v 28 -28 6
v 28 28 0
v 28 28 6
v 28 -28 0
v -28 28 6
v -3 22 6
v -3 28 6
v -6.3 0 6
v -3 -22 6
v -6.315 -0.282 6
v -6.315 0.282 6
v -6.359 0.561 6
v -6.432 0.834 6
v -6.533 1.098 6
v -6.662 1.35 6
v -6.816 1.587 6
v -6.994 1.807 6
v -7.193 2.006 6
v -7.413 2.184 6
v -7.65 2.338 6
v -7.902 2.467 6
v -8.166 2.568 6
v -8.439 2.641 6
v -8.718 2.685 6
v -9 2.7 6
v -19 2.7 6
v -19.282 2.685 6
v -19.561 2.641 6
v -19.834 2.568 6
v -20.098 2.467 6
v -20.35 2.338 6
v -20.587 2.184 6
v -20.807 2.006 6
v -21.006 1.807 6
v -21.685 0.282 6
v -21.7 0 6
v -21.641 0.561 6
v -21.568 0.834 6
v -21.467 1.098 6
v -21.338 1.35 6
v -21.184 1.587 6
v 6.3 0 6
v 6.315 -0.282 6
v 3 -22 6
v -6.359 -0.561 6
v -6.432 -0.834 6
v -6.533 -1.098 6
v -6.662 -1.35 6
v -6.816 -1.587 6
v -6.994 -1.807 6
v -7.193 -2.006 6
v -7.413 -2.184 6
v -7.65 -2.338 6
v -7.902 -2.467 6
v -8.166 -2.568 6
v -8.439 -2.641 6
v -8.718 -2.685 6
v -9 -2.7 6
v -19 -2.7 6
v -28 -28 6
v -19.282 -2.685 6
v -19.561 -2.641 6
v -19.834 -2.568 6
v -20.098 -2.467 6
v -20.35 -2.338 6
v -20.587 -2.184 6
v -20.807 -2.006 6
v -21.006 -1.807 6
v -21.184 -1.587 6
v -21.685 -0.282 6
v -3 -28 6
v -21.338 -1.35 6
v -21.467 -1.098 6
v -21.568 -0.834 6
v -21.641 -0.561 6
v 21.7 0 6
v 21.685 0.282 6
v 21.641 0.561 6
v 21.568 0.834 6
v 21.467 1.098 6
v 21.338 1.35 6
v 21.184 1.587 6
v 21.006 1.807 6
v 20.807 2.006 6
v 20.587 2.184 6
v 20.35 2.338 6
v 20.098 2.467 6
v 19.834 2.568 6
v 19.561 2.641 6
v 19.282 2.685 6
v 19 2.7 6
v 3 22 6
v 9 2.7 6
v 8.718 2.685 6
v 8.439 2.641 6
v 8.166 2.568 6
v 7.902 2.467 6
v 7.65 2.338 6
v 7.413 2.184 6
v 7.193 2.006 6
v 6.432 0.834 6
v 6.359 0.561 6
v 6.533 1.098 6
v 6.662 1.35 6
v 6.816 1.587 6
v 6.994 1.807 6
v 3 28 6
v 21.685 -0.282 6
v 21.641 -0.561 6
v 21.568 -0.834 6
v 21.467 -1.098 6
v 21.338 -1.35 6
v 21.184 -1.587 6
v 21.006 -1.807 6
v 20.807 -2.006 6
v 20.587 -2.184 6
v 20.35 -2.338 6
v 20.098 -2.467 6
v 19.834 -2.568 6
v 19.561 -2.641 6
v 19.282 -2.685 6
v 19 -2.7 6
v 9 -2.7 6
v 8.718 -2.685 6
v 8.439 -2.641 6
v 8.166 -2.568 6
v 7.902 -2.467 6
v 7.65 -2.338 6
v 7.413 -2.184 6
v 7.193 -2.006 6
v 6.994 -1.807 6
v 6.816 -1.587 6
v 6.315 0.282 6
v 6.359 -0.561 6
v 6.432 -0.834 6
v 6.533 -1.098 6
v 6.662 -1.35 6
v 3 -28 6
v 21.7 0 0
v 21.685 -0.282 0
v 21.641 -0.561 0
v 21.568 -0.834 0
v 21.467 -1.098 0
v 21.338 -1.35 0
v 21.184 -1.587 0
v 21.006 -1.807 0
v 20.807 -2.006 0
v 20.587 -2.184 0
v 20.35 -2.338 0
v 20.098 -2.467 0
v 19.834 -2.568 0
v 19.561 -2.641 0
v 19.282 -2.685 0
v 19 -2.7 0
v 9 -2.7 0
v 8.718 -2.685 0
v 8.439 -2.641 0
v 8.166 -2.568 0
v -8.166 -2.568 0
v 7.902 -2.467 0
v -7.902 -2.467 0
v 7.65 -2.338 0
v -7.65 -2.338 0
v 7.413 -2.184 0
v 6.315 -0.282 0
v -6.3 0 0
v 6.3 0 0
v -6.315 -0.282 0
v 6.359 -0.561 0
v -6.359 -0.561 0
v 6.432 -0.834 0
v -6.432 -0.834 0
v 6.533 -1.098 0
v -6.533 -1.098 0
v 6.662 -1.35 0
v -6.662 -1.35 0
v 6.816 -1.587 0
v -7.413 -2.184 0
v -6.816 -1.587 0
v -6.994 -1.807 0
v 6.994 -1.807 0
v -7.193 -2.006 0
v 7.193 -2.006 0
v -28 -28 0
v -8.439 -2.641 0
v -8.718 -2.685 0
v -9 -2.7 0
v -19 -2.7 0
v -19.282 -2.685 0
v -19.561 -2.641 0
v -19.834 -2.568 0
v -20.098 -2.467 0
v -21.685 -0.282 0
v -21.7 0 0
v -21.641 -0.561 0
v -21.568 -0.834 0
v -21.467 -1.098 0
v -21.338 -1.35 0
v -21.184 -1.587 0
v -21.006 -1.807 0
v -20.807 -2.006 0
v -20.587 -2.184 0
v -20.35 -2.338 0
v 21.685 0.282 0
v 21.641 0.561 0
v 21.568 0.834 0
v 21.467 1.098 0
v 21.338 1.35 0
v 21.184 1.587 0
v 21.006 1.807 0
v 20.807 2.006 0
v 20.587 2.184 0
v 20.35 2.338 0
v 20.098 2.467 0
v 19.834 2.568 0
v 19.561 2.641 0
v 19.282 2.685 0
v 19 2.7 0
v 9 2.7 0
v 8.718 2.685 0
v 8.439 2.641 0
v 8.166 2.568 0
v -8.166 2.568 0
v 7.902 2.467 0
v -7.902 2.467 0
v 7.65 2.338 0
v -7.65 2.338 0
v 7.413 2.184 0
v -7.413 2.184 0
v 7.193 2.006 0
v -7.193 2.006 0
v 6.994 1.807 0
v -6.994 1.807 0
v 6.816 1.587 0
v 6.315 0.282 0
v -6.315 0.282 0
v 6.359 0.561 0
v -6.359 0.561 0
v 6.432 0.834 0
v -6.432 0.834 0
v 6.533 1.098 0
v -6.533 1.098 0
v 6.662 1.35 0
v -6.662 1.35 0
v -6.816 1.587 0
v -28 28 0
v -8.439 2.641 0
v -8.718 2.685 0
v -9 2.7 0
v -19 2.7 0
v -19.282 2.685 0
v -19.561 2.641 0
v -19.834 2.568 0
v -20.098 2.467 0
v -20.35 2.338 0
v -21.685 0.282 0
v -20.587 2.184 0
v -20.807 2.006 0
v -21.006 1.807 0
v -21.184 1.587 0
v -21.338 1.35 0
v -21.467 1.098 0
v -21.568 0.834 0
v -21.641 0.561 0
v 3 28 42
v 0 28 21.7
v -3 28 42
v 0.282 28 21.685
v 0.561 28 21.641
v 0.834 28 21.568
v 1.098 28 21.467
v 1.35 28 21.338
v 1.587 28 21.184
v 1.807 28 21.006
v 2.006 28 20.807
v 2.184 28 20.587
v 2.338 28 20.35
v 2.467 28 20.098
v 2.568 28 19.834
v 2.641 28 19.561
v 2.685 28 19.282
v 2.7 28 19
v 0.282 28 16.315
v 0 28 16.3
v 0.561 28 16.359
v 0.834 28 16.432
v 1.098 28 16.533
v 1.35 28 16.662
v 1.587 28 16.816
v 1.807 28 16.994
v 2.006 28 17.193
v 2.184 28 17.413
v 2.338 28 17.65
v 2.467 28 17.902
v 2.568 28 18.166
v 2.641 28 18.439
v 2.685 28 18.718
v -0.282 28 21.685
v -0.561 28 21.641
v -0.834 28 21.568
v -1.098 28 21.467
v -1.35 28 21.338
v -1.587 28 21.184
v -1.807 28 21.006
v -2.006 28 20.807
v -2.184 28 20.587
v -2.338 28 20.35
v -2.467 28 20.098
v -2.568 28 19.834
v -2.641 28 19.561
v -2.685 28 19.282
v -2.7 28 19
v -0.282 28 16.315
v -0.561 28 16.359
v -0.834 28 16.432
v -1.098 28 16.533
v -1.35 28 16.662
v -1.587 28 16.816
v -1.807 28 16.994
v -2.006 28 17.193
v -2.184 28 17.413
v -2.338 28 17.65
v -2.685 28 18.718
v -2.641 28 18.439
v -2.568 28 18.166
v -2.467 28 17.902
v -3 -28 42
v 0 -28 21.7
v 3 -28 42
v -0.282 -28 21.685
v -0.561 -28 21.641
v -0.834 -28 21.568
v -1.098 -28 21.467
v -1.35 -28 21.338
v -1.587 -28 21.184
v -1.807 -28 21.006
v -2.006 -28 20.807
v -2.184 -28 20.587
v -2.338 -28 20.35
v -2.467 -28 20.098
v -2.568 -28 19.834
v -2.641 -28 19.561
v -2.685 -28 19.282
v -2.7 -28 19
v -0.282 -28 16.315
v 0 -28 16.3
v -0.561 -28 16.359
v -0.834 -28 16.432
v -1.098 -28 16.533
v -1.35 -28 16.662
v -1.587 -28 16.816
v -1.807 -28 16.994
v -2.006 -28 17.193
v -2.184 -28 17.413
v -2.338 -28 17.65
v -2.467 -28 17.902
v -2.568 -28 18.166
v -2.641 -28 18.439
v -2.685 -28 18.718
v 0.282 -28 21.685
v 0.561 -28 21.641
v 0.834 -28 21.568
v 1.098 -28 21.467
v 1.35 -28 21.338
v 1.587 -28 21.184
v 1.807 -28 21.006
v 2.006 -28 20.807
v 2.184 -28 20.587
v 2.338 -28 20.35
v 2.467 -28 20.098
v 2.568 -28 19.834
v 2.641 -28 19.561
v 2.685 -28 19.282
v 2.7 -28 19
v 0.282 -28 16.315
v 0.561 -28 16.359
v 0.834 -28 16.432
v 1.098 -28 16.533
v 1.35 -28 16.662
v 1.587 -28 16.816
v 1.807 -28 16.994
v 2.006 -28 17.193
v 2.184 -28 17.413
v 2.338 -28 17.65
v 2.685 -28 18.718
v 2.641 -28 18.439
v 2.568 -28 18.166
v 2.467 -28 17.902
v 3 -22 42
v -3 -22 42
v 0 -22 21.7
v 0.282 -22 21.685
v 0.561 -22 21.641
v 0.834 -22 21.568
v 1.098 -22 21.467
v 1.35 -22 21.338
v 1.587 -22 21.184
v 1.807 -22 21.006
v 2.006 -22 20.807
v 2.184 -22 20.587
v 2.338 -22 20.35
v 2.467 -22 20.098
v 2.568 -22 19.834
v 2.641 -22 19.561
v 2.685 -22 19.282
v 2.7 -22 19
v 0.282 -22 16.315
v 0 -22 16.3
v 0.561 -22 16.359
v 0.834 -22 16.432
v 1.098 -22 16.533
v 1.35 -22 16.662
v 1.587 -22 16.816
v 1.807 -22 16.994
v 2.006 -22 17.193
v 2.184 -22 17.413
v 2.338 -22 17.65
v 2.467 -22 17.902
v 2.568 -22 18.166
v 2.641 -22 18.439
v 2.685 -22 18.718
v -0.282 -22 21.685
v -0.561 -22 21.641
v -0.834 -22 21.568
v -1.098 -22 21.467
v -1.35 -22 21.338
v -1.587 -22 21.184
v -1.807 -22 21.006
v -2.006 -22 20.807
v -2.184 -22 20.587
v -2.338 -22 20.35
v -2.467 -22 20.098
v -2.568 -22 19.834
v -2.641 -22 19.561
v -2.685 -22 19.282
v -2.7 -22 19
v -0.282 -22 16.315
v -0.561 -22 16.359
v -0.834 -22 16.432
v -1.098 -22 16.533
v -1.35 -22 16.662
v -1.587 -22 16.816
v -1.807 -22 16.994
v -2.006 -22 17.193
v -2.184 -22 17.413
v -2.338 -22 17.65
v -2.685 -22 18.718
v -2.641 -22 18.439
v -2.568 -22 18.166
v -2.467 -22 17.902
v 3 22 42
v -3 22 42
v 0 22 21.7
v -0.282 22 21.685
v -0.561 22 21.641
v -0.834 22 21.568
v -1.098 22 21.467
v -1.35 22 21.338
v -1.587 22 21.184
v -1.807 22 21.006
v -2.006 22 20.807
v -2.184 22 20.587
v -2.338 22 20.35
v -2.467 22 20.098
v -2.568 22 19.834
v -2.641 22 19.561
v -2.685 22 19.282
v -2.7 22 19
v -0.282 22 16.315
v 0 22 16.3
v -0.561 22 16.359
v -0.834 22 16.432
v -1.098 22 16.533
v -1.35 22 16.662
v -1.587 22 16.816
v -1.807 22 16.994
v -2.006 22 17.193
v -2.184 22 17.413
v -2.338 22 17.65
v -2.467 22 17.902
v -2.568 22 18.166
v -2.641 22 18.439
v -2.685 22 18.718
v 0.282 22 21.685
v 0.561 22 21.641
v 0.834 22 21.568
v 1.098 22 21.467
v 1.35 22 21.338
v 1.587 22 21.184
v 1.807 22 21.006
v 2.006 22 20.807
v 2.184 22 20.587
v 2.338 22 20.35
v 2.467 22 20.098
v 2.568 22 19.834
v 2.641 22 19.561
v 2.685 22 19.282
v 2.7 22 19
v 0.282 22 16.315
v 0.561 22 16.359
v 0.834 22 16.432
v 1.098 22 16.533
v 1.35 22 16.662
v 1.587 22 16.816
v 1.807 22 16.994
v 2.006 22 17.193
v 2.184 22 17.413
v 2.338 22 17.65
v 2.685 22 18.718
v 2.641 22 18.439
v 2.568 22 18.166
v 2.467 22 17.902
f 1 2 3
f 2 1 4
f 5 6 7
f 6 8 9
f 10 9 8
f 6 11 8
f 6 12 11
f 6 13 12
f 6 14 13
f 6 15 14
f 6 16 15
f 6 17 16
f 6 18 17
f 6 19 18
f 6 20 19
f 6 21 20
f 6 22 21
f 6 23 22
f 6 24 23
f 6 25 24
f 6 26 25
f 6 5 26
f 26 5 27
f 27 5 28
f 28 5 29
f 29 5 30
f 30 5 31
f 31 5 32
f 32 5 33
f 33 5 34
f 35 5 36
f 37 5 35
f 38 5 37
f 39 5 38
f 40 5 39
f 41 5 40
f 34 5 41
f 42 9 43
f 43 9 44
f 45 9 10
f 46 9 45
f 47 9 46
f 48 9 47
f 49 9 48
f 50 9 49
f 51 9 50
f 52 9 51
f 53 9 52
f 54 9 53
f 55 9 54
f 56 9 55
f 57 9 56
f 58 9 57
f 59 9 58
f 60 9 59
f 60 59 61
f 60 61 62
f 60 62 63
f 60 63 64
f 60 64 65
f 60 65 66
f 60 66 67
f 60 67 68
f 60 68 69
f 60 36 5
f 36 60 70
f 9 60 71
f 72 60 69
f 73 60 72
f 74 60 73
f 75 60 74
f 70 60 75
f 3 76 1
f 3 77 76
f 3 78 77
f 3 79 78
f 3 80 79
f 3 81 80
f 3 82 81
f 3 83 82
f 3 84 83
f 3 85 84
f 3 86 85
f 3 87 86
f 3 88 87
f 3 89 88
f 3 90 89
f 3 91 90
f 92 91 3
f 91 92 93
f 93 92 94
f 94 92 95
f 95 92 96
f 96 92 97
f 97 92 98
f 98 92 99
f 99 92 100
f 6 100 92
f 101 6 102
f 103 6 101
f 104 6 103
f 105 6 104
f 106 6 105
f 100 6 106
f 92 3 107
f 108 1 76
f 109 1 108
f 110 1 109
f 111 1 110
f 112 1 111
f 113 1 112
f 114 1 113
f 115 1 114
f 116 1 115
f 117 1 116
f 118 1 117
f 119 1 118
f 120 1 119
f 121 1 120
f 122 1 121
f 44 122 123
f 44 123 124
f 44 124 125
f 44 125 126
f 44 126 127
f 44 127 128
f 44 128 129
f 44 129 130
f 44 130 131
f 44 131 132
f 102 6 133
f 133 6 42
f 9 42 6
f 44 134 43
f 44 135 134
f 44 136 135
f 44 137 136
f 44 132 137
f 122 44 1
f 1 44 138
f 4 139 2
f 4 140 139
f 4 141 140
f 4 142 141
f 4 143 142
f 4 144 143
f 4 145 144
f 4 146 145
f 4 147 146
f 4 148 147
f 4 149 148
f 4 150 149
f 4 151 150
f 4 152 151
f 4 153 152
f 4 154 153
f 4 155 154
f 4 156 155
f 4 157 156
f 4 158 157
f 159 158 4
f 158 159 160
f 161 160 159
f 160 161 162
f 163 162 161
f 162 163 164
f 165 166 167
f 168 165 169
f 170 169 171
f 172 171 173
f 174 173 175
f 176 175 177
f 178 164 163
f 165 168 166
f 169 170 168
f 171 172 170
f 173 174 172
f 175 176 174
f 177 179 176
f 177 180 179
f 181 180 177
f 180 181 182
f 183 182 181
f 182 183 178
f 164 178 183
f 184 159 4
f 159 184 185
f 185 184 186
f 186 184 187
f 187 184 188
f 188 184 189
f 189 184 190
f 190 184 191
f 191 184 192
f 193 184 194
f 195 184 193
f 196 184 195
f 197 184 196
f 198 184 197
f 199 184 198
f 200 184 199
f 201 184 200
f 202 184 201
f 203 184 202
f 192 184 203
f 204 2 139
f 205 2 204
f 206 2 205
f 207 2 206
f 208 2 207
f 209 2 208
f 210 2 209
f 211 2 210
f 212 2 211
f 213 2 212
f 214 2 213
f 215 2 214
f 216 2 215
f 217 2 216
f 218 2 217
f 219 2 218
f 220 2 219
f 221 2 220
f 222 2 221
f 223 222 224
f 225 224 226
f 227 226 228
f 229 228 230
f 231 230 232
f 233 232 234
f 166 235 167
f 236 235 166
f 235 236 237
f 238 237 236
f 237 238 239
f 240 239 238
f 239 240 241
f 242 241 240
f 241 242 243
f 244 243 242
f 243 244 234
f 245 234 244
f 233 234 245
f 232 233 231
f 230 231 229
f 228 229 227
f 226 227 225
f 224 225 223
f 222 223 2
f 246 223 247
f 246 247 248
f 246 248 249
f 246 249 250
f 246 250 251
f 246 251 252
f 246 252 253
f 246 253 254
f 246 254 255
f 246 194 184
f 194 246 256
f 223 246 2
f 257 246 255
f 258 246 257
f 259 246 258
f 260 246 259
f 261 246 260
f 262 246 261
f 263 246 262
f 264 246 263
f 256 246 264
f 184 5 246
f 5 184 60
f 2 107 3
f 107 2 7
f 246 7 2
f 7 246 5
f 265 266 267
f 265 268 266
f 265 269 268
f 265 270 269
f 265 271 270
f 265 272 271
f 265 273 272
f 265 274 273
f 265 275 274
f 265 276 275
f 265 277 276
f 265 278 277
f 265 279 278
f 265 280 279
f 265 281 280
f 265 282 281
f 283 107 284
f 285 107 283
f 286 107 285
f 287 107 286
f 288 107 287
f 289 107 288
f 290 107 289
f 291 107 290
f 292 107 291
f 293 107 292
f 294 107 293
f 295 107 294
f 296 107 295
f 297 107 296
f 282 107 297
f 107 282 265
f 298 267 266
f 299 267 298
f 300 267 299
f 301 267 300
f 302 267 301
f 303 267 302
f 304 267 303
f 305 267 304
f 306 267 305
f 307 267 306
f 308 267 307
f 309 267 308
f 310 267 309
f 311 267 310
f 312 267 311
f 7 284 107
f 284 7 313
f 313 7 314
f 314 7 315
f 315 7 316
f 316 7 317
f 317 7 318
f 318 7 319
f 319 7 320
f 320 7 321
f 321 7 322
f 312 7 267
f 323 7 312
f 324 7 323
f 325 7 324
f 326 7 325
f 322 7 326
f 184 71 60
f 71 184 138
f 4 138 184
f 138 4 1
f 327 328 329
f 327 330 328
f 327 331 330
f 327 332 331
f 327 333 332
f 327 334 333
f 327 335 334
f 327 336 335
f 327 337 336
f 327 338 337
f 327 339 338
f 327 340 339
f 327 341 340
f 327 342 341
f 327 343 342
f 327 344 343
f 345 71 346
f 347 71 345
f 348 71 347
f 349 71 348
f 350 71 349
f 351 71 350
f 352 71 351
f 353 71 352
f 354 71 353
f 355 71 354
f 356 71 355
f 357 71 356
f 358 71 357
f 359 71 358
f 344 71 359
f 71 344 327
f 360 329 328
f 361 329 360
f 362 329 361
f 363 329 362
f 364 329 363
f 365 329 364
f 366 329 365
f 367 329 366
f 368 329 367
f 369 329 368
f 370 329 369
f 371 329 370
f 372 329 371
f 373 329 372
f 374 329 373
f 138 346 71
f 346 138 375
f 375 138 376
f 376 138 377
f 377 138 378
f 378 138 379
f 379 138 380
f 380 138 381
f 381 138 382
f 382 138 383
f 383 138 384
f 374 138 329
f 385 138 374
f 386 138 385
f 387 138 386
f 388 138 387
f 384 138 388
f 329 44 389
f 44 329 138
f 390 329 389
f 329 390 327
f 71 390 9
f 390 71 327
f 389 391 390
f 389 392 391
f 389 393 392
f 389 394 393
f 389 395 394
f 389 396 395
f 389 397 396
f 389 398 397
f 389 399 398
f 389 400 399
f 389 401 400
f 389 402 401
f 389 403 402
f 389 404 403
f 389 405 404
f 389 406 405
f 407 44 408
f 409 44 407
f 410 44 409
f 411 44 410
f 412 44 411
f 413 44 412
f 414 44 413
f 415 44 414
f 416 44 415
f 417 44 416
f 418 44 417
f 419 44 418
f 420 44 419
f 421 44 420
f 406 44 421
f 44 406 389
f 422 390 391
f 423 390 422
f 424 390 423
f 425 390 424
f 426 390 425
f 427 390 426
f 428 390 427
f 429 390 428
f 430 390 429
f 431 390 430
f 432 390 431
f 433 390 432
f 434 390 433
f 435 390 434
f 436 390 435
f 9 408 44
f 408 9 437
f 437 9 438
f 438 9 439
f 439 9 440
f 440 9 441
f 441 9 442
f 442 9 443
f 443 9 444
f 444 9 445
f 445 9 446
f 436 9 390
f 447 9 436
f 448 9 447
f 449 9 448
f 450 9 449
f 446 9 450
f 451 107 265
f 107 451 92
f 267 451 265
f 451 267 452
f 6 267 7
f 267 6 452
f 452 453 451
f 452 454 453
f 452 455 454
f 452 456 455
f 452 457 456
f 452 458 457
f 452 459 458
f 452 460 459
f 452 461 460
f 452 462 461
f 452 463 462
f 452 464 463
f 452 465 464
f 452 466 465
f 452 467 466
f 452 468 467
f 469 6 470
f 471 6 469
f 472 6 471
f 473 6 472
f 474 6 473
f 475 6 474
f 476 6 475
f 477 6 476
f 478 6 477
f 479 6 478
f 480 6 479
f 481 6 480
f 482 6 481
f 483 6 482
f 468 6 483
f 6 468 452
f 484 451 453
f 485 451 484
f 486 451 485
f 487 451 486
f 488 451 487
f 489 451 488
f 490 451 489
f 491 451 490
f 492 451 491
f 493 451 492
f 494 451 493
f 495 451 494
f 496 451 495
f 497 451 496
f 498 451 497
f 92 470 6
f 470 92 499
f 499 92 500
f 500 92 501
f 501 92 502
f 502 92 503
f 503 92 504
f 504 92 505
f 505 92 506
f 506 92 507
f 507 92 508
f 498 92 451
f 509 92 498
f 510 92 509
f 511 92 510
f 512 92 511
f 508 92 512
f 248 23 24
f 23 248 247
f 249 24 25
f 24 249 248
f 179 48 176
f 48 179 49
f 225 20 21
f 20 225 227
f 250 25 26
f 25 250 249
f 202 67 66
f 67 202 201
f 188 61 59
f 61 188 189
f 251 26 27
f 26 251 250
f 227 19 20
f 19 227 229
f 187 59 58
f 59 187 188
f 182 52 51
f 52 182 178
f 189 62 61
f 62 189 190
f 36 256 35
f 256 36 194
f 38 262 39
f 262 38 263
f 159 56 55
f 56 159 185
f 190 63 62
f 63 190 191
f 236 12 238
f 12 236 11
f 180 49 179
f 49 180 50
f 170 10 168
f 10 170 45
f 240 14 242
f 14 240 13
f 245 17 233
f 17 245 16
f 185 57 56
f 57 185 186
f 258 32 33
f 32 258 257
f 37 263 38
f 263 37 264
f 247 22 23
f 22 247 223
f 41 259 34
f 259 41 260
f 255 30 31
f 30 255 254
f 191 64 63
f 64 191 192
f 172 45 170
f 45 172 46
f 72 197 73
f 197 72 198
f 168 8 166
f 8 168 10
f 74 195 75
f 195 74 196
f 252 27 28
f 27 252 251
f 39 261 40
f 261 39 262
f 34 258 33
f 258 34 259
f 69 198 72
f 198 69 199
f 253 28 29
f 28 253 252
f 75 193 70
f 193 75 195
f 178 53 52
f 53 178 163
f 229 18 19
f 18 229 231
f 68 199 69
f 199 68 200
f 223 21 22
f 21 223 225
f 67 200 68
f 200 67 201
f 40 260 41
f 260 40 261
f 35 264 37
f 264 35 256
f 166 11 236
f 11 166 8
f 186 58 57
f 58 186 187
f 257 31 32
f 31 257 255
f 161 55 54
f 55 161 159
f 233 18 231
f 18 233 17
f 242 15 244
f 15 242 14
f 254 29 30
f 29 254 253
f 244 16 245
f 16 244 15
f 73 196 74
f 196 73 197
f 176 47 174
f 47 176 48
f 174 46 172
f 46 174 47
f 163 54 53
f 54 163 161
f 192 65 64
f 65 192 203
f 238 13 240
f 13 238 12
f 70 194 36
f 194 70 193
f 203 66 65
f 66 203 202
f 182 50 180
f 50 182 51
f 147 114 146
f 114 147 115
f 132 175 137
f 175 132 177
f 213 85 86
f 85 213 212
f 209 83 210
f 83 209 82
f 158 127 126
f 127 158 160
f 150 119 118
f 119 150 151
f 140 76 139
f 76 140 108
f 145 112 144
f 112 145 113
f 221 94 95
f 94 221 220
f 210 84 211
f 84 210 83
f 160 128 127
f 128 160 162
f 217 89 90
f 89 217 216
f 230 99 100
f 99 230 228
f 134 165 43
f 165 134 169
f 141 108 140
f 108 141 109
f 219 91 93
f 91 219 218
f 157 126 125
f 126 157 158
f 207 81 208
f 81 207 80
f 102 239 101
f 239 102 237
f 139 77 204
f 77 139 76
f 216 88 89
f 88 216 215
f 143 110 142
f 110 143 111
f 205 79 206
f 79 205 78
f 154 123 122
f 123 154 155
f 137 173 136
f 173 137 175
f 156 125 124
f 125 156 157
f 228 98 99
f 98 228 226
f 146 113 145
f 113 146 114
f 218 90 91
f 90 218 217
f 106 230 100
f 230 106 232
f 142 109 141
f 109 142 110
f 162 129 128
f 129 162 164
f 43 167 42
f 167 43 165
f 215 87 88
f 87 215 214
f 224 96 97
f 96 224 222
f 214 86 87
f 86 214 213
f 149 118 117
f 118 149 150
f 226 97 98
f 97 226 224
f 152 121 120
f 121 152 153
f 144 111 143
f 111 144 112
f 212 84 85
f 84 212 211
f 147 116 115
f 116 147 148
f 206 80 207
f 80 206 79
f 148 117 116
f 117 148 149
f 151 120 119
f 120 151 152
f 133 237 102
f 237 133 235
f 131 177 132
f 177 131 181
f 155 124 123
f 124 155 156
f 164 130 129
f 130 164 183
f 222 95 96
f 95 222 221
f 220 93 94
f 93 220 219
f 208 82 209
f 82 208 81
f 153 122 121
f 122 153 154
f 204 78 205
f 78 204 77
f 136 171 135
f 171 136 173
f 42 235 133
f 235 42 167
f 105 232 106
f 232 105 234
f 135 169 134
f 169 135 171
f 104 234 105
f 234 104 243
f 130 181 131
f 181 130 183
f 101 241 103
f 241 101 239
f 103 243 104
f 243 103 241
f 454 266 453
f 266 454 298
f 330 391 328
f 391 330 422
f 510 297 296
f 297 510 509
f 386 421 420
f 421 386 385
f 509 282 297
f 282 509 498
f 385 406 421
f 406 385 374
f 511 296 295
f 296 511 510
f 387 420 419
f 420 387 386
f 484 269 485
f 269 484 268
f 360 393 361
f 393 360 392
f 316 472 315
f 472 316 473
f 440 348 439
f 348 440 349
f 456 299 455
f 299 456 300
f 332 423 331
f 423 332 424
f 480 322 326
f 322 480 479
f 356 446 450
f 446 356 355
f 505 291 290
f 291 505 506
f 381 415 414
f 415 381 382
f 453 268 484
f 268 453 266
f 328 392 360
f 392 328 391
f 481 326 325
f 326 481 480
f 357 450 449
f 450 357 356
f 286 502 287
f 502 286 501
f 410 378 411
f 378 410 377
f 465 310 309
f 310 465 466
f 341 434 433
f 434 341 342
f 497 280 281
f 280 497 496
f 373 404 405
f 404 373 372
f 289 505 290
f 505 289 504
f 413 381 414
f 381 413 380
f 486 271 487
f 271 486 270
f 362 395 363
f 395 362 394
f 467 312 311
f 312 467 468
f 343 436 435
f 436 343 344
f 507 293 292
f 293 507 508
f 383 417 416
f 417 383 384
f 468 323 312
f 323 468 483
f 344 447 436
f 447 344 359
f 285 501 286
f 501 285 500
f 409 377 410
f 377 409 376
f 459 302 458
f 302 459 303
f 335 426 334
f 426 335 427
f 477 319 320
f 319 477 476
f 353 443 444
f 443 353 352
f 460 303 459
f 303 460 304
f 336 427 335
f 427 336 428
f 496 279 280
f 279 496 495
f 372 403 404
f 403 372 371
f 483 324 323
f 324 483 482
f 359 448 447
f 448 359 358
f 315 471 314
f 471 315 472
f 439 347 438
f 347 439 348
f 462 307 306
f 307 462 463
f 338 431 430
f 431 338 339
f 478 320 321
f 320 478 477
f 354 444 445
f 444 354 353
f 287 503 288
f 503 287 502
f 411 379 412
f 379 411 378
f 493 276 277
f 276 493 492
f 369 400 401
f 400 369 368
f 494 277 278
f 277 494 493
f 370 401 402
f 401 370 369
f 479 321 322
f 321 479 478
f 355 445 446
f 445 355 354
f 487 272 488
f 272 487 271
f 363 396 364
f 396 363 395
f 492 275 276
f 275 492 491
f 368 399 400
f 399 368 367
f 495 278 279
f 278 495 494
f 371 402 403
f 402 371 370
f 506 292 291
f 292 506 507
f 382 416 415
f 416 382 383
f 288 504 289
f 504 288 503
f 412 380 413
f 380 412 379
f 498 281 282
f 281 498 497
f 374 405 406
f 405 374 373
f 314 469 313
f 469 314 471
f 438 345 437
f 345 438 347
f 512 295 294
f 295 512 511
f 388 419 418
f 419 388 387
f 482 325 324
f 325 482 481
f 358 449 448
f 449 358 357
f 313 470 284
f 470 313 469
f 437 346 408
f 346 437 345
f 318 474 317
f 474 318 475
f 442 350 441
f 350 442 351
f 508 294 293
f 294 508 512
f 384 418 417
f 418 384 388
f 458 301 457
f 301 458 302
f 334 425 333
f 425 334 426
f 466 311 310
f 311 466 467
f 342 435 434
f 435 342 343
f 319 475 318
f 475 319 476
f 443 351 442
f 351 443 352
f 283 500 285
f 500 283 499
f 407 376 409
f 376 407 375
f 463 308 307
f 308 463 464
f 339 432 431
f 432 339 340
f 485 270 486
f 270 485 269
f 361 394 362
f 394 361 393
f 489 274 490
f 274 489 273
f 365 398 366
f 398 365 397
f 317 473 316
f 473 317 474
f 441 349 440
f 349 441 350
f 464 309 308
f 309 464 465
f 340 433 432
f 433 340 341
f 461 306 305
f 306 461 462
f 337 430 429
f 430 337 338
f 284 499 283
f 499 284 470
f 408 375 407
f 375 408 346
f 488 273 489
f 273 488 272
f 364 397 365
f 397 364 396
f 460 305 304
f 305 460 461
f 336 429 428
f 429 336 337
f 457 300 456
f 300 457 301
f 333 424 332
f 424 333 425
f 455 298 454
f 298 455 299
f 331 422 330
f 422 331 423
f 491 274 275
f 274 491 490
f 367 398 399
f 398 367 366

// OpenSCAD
// U pivot bracket, 44 mm opening.
$fn = 60;
eps = 0.02;
base_l = 56;
base_w = 56;
base_t = 6;
ear_t = 6;
ear_h = 38;
pivot_d = 5.4;
module mount(x) {
    hull() {
        translate([x - 5, 0, -eps]) cylinder(d = 5.4, h = base_t + 2 * eps);
        translate([x + 5, 0, -eps]) cylinder(d = 5.4, h = base_t + 2 * eps);
    }
}
difference() {
    union() {
        translate([-base_l / 2, -base_w / 2, 0]) cube([base_l, base_w, base_t]);
        translate([-ear_t / 2, -base_w / 2, base_t - 2]) cube([ear_t, ear_t, ear_h]);
        translate([-ear_t / 2, base_w / 2 - ear_t, base_t - 2]) cube([ear_t, ear_t, ear_h]);
    }
    mount(-14); mount(14);
    translate([0, -base_w / 2 - eps, ear_h / 2]) rotate([-90, 0, 0]) cylinder(d = pivot_d, h = base_w + 2 * eps);
}
